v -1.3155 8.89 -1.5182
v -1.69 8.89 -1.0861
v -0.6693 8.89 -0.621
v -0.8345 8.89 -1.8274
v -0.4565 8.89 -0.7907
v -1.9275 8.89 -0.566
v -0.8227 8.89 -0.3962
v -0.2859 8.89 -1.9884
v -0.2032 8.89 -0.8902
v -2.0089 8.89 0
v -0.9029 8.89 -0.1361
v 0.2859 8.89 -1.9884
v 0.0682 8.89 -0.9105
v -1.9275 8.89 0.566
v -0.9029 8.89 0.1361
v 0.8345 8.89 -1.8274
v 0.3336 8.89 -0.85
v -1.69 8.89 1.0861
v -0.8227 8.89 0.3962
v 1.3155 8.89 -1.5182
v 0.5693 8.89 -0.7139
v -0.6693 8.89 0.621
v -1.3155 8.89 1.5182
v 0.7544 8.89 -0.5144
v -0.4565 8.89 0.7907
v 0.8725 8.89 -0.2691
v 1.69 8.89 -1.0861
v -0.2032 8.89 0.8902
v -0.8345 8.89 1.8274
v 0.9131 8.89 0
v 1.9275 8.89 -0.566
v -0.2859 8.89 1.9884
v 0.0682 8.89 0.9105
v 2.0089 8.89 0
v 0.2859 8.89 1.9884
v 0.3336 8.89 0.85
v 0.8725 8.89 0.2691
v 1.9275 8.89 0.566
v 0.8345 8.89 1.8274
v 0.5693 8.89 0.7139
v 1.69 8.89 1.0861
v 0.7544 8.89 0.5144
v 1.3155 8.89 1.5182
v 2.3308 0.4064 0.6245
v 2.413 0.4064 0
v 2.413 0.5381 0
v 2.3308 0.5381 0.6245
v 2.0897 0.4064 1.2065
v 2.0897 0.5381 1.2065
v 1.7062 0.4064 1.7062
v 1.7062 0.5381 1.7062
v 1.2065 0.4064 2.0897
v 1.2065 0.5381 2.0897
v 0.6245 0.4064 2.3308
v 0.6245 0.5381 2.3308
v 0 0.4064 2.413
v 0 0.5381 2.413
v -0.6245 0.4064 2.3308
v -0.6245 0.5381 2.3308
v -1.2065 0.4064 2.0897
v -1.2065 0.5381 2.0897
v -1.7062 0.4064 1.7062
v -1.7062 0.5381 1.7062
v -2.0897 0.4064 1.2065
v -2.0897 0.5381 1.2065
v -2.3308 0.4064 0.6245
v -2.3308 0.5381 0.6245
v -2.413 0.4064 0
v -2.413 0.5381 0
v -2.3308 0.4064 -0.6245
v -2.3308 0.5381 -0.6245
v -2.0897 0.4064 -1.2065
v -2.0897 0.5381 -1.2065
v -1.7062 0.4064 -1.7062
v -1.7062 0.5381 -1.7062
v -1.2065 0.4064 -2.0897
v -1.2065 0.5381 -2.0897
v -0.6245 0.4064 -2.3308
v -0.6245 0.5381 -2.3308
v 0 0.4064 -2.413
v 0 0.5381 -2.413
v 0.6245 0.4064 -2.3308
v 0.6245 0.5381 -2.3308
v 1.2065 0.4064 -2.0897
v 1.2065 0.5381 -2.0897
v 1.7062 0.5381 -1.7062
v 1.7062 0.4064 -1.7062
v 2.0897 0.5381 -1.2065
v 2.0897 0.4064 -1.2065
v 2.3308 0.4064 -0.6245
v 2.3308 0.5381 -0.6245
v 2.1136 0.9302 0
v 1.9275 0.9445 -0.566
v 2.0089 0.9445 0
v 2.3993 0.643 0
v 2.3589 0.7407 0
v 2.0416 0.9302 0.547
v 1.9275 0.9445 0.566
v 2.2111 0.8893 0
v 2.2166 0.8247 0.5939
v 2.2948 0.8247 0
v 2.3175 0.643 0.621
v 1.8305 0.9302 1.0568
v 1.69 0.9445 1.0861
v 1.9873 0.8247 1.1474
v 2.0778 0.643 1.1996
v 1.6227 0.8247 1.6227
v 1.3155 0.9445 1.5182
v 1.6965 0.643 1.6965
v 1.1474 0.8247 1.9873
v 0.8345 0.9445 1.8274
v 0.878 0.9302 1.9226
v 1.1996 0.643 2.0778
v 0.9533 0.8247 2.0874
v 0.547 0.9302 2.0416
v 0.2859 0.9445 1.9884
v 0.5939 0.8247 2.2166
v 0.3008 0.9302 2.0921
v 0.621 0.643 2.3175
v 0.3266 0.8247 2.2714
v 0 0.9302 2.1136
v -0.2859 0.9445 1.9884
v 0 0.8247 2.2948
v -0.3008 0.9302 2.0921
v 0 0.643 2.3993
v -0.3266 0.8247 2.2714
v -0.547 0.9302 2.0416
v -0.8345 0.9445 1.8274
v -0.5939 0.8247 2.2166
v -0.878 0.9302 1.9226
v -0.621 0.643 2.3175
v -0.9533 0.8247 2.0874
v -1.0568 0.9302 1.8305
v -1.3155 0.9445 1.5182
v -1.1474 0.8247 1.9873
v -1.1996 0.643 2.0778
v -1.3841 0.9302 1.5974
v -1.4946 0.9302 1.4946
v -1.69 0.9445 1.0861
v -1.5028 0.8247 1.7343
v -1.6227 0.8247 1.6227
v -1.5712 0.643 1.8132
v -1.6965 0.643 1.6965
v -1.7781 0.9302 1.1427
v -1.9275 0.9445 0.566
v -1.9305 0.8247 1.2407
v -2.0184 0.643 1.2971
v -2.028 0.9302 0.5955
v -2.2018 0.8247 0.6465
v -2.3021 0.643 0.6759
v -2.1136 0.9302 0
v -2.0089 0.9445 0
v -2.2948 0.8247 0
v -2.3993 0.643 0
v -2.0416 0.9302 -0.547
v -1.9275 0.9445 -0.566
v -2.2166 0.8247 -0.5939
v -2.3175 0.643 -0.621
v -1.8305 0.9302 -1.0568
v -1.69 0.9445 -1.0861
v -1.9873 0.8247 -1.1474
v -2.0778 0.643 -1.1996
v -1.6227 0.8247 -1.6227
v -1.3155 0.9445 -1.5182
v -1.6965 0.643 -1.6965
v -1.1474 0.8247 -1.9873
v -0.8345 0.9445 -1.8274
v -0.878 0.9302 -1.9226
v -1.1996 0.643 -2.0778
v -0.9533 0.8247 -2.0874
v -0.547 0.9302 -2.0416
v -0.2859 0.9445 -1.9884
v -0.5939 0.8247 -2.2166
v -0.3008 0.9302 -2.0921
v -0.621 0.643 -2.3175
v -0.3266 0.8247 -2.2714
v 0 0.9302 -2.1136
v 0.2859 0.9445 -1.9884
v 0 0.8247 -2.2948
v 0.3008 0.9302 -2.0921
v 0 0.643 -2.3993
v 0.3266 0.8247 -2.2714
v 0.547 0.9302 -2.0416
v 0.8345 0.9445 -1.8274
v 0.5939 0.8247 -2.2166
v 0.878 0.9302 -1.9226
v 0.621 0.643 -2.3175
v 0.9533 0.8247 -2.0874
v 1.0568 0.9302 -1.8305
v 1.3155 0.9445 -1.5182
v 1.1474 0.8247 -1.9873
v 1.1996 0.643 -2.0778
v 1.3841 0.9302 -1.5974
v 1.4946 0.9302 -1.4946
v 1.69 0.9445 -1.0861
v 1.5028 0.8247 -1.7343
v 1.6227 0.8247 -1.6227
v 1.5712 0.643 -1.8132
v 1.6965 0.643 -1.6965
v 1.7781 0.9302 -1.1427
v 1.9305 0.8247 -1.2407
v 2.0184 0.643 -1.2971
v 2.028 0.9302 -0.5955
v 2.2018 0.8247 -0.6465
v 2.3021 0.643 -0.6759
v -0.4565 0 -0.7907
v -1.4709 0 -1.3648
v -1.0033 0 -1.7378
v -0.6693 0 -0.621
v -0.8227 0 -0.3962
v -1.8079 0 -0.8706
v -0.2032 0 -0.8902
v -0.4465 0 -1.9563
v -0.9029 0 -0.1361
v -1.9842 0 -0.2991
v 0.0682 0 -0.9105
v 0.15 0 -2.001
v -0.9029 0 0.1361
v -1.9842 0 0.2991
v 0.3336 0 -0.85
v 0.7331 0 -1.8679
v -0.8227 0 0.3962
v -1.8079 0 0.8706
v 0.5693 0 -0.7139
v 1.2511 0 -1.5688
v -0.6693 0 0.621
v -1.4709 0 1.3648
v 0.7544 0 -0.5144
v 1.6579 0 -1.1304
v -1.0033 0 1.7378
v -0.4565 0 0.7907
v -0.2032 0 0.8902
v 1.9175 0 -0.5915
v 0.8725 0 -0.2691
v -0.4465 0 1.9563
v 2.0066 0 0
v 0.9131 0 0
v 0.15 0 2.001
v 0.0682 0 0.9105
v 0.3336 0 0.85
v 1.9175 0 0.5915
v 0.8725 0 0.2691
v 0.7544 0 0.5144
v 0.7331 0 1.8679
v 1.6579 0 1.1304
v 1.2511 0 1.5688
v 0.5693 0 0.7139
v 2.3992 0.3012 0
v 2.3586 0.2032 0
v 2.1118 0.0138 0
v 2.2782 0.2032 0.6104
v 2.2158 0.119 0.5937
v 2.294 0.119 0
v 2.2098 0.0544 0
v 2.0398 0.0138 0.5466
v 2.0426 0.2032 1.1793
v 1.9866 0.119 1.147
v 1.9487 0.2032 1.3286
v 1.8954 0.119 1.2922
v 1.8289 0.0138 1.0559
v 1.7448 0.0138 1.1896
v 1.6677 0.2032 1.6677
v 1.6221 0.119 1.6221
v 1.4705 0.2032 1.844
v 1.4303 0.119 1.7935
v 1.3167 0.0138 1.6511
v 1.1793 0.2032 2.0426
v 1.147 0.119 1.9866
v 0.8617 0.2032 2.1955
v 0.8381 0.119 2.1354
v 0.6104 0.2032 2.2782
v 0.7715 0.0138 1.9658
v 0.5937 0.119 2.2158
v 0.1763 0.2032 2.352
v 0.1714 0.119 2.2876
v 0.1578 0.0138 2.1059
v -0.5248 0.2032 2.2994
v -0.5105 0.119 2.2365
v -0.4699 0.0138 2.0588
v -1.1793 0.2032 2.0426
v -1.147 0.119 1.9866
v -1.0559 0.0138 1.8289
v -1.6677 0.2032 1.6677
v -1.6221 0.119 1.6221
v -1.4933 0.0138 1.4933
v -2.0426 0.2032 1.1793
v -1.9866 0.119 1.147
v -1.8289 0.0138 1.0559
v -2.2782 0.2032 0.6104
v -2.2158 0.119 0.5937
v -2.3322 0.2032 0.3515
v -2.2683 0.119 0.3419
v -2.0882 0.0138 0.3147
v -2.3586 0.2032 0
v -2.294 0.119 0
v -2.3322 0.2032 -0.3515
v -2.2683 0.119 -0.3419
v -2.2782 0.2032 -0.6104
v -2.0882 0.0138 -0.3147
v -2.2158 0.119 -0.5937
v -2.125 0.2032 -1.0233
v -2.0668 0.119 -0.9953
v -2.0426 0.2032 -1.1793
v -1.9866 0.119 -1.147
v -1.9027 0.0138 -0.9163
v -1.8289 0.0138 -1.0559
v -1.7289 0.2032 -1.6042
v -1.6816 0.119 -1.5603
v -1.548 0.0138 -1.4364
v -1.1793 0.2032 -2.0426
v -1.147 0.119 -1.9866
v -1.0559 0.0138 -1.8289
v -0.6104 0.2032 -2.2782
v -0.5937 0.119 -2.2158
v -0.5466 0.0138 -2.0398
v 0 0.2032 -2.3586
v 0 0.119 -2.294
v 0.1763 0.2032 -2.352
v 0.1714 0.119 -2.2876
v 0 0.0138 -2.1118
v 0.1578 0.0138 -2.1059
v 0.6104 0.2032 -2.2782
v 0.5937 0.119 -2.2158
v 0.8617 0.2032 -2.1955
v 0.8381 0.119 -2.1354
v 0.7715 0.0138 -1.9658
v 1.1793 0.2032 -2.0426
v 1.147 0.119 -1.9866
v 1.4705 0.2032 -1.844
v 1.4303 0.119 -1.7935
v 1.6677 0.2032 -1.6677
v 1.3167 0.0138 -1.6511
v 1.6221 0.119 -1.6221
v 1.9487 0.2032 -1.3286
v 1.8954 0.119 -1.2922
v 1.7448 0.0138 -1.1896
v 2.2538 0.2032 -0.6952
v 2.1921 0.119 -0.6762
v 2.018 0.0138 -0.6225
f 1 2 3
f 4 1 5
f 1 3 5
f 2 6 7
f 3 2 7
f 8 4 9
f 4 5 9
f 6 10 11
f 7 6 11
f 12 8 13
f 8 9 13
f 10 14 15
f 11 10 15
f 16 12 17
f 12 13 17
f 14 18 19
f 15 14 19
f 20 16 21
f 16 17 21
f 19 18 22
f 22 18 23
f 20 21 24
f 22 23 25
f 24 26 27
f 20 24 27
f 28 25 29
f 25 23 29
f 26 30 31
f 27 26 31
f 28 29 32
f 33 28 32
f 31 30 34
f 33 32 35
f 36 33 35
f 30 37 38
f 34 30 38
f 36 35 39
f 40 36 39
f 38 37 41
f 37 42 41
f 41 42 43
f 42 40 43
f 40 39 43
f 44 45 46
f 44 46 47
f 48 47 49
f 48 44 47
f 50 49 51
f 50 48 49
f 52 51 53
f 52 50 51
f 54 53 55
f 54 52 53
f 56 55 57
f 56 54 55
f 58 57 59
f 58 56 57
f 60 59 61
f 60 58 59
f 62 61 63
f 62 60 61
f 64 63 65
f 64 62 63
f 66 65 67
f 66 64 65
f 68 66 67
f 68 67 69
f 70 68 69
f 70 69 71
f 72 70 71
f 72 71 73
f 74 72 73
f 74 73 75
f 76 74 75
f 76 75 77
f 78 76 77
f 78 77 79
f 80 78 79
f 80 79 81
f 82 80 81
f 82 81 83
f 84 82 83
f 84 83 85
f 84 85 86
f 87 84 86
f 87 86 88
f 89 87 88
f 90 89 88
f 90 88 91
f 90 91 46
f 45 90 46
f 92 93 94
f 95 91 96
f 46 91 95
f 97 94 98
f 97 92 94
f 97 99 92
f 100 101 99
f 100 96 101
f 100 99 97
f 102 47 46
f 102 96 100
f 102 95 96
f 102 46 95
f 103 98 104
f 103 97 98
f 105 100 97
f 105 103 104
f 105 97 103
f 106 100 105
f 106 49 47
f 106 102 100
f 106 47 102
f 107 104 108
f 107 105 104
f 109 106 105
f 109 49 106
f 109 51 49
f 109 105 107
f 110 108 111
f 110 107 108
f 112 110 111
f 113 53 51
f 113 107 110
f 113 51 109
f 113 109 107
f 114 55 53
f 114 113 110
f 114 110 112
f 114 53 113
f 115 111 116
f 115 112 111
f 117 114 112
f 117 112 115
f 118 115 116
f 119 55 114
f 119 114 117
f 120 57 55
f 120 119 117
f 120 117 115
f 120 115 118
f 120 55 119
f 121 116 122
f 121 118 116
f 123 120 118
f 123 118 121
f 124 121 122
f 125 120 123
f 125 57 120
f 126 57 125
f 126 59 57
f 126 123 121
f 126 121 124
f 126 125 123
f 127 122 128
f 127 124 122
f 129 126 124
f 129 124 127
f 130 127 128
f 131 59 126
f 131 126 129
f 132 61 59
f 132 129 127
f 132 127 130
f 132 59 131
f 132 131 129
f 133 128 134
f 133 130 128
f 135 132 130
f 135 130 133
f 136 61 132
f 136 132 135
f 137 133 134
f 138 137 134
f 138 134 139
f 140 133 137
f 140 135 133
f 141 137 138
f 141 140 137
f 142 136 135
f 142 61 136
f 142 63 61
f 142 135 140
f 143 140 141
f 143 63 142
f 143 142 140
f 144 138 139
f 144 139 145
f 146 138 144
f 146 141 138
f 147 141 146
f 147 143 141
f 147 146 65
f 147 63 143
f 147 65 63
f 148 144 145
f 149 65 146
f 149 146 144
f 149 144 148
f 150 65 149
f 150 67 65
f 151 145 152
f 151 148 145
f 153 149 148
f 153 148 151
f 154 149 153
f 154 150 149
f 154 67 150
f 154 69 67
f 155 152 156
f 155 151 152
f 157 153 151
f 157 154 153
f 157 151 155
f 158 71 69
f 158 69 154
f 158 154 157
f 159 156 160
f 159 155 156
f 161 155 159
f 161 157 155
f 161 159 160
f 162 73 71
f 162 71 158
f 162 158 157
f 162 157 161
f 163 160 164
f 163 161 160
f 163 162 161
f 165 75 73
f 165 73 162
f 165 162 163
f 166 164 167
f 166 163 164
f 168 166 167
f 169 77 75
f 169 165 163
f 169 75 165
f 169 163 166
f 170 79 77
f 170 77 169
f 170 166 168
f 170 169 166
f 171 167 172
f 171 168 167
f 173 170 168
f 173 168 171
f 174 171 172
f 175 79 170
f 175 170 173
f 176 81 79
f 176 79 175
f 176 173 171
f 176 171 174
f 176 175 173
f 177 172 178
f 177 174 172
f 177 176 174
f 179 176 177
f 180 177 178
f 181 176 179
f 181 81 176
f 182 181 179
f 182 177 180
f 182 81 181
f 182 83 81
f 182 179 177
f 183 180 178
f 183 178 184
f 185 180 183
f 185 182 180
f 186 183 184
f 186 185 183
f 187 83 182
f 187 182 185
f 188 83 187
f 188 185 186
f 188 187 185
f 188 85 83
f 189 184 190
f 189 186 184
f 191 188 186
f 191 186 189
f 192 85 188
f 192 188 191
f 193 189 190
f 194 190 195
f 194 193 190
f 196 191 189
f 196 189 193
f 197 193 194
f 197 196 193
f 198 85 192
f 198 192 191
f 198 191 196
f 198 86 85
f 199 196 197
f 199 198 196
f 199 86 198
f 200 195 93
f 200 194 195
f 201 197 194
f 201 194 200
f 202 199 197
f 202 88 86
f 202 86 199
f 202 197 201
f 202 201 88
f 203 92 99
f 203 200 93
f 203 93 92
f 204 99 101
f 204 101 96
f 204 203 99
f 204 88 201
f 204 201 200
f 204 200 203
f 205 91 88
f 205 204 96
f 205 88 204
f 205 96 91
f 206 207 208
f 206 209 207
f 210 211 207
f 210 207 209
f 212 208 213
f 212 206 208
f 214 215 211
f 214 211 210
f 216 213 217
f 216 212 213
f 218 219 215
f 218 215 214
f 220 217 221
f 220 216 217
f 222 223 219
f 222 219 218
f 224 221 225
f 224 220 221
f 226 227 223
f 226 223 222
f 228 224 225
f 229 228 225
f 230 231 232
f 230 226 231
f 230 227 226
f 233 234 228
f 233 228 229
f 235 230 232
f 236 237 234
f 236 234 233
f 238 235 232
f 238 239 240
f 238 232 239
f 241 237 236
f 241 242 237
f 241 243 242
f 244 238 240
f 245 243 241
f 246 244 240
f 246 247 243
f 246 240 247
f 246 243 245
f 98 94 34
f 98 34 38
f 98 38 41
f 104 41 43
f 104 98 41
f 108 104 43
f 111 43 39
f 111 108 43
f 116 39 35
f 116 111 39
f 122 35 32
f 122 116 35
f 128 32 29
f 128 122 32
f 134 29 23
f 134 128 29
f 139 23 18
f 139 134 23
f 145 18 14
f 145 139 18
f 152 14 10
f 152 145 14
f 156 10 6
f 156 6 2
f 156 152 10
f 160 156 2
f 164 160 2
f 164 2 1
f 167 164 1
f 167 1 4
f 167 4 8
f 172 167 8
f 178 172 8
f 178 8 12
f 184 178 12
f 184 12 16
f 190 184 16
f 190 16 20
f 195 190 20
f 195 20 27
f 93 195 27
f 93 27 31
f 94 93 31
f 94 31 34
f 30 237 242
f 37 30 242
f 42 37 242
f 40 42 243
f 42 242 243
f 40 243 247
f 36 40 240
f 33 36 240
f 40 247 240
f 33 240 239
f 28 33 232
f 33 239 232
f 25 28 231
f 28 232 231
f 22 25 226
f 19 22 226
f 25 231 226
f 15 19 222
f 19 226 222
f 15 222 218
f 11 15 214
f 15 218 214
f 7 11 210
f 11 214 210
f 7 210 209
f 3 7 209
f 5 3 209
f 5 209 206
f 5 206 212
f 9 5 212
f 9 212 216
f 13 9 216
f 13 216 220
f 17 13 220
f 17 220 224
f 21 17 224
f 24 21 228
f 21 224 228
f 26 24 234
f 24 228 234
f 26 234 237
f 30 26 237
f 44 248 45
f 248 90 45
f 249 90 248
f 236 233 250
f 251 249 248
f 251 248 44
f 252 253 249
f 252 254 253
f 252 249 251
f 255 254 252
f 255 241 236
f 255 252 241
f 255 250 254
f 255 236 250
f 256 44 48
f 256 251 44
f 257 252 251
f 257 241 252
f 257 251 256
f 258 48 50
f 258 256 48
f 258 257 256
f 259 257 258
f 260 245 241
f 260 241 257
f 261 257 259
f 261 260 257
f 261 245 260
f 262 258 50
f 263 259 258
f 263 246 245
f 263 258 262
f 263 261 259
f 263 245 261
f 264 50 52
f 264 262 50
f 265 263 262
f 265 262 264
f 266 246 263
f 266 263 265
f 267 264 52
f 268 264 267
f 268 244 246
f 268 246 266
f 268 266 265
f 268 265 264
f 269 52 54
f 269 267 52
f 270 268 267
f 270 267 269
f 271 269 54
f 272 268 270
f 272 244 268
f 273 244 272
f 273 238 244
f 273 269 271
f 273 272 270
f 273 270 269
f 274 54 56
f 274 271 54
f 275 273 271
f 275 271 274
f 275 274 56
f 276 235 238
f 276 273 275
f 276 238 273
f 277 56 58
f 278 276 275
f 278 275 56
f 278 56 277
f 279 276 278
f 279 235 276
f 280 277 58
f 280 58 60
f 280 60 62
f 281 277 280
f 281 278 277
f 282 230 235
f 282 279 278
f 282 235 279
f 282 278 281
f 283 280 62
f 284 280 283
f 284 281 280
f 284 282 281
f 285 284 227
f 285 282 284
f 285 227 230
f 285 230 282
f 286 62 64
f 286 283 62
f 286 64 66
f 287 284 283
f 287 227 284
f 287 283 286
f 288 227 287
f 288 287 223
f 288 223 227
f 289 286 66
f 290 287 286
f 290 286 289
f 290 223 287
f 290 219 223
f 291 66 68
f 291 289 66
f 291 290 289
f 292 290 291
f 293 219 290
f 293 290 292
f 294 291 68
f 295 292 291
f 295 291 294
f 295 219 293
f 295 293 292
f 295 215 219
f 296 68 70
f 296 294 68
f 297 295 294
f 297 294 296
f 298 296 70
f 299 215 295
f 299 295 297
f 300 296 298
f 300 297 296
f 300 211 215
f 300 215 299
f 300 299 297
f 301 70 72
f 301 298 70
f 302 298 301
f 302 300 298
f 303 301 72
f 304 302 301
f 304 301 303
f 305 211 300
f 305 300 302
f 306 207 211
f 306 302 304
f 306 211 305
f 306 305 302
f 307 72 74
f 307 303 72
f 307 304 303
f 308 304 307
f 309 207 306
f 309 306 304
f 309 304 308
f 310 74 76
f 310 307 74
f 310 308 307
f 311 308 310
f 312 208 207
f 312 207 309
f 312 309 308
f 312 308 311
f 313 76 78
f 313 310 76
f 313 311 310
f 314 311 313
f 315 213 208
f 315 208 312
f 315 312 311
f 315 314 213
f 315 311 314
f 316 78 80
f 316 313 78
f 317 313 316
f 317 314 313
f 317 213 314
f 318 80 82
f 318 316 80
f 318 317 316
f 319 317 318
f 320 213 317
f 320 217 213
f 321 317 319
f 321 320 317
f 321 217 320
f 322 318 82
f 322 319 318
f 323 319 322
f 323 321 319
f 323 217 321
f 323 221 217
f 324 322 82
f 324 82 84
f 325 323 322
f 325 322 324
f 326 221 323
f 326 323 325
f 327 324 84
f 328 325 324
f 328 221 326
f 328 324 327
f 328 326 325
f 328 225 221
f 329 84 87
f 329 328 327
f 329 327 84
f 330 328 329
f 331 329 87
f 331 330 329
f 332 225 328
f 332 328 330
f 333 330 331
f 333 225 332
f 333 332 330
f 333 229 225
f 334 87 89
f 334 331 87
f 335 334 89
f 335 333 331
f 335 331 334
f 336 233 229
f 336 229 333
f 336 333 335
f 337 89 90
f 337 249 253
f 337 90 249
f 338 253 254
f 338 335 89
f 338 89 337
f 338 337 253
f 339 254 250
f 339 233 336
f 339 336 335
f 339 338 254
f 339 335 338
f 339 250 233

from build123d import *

# Parameters (mm, degrees)
F0_R        = 2.0088927205
F0_R_2      = 0.9130728347
F1_DEPTH    = 8.89
F0_R_3      = 2.413
F2_DEPTH    = 0.94454
F3_S5_R     = 2.0088927205
F3_T6_DEPTH = 5


# Not quite as in the source:
# - a fillet or chamfer that OpenCascade refuses, or shapes differently, is made with other operations: its cross-section is extruded or revolved along the edge and cut away or added


with BuildPart() as f1:
    # F0 (on Front) → F1 (new body)
    with BuildSketch(Plane.XZ):
        Circle(F0_R)
        Circle(F0_R_2, mode=Mode.SUBTRACT)
    extrude(amount=-F1_DEPTH)

    # F0 (on Front) → F2 (join)
    with BuildSketch(Plane.XZ):
        Circle(F0_R_3)
        Circle(F0_R, mode=Mode.SUBTRACT)
    extrude(amount=-F2_DEPTH)

    # F3: fillet of radius 0.4064 on 2 edges, made by hand


with BuildPart() as f3_tool2:
    # F3_s3 → F3_t4 (revolve)
    with BuildSketch(Plane.XY):
        with BuildLine():
            ThreePointArc((2.0066, 0.94454), (2.2939681959, 0.8255081959), (2.413, 0.53814))
            Line((2.413, 0.53814), (2.413, 0.94454))
            Line((2.413, 0.94454), (2.0066, 0.94454))
        make_face()
    revolve(axis=Axis((0, 0.94454, 0), (0, -1, 0)))

    # F3_s5 → F3_t6 (cut, symmetric)
    with BuildSketch(Plane.XZ.offset(-0.6)):
        Circle(F3_S5_R)
    extrude(amount=F3_T6_DEPTH, both=True, mode=Mode.SUBTRACT)


with BuildPart() as f1_1:
    add(f1.part)

    # F3_t1: cut F3_tool2
    add(f3_tool2.part, mode=Mode.SUBTRACT)

    # F3_s7 → F3_t8 (revolve, cut)
    with BuildSketch(Plane.XY):
        with BuildLine():
            ThreePointArc((2.413, 0.4064), (2.2939681959, 0.1190318041), (2.0066, 0))
            Line((2.0066, 0), (2.413, 0))
            Line((2.413, 0), (2.413, 0.4064))
        make_face()
    revolve(axis=Axis((0, 0, 0), (0, -1, 0)), mode=Mode.SUBTRACT)


solid = f1_1.part
